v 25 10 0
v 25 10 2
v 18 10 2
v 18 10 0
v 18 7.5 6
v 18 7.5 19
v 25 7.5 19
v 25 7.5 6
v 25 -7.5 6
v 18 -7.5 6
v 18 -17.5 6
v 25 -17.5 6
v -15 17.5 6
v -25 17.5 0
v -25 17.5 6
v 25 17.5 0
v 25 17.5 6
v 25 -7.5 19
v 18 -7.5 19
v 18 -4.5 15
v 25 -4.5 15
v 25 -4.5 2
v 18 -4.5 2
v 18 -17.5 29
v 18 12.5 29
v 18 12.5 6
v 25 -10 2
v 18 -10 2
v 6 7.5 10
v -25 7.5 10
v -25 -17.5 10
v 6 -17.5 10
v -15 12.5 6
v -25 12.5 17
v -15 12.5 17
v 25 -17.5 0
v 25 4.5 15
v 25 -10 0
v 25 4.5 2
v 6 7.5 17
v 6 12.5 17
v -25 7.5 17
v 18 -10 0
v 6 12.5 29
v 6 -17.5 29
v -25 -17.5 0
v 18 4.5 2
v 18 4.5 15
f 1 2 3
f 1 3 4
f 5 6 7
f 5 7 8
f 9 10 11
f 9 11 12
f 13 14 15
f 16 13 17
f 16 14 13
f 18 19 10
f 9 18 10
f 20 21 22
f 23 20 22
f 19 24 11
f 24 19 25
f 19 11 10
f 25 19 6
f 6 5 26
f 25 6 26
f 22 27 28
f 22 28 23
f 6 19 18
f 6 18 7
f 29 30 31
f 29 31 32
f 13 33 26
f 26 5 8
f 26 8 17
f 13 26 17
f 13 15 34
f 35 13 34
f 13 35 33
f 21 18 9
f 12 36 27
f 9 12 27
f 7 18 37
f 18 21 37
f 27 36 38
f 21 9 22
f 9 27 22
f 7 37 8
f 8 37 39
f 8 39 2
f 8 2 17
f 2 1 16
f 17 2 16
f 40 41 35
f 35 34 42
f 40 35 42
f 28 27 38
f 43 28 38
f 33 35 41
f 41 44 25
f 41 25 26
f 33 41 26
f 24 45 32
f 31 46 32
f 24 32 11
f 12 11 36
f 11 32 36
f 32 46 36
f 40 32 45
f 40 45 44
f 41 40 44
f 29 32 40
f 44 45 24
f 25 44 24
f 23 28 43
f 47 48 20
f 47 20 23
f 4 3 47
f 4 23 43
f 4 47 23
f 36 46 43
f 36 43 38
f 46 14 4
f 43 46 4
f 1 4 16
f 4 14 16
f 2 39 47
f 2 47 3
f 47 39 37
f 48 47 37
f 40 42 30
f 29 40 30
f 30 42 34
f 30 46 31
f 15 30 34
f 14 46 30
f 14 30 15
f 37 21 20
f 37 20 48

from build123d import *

# Parameters (mm, degrees)
SKETCH_1_W          = 50
SKETCH_1_H          = 35
EXTRUDE_1_DEPTH     = 6
SKETCH_2_W          = 12
SKETCH_2_H          = 30
EXTRUDE_2_DEPTH     = 23
SKETCH_7_W          = 13
SKETCH_7_H          = 15
EXTRUDE_3_DEPTH     = 7
SKETCH_8_W          = 13
SKETCH_8_H          = 9
SKETCH_8_W_2        = 2
SKETCH_8_H_2        = 5.5
CUT_EXTRUDE_4_DEPTH = 7
EXTRUDE_4_DEPTH     = 31
SKETCH_11_W         = 11
SKETCH_11_H         = 5
CUT_EXTRUDE_5_DEPTH = 21
SKETCH_12_W         = 31
SKETCH_12_H         = 25
EXTRUDE_5_DEPTH     = 4


with BuildPart() as part:
    # Эскиз1 → Бобышка-Вытянуть1 (new body)
    with BuildSketch(Plane.XY):
        Rectangle(SKETCH_1_W, SKETCH_1_H)
    extrude(amount=EXTRUDE_1_DEPTH)

    # Эскиз2 → Бобышка-Вытянуть2 (add)
    with BuildSketch(Plane.XY.offset(6)):
        with Locations((12, -2.5)):
            Rectangle(SKETCH_2_W, SKETCH_2_H)
    extrude(amount=EXTRUDE_2_DEPTH)

    # Эскиз7 → Бобышка-Вытянуть3 (add)
    with BuildSketch(Plane(origin=(18, 0, 0), x_dir=(0, 0, -1), z_dir=(1, 0, 0))):
        with Locations((-12.5, 0)):
            Rectangle(SKETCH_7_W, SKETCH_7_H)
    extrude(amount=EXTRUDE_3_DEPTH)

    # Эскиз8 → Вырез-Вытянуть4 (cut)
    with BuildSketch(Plane(origin=(25, 0, 0), x_dir=(0, 0, -1), z_dir=(1, 0, 0))):
        with Locations((-8.5, 0)):
            Rectangle(SKETCH_8_W, SKETCH_8_H)
        with Locations((-1, -7.25)):
            Rectangle(SKETCH_8_W_2, SKETCH_8_H_2)
        with Locations((-1, 0)):
            Rectangle(SKETCH_8_W_2, SKETCH_8_H)
        with Locations((-1, 7.25)):
            Rectangle(SKETCH_8_W_2, SKETCH_8_H_2)
    extrude(amount=-CUT_EXTRUDE_4_DEPTH, mode=Mode.SUBTRACT)

    # Эскиз9 → Бобышка-Вытянуть4 (add)
    with BuildSketch(Plane.ZY.offset(25)):
        Polygon((6, 17.5), (17, 12.5), (17, 7.5), (6, 7.5), align=None)
    extrude(amount=-EXTRUDE_4_DEPTH)

    # Эскиз11 → Вырез-Вытянуть5 (cut)
    with BuildSketch(Plane(origin=(6, 0, 0), x_dir=(0, 0, -1), z_dir=(1, 0, 0))):
        with Locations((-11.5, 15)):
            Rectangle(SKETCH_11_W, SKETCH_11_H)
    extrude(amount=-CUT_EXTRUDE_5_DEPTH, mode=Mode.SUBTRACT)

    # Эскиз12 → Бобышка-Вытянуть5 (add)
    with BuildSketch(Plane.XY.offset(6)):
        with Locations((-9.5, -5)):
            Rectangle(SKETCH_12_W, SKETCH_12_H)
    extrude(amount=EXTRUDE_5_DEPTH)


solid = part.part
